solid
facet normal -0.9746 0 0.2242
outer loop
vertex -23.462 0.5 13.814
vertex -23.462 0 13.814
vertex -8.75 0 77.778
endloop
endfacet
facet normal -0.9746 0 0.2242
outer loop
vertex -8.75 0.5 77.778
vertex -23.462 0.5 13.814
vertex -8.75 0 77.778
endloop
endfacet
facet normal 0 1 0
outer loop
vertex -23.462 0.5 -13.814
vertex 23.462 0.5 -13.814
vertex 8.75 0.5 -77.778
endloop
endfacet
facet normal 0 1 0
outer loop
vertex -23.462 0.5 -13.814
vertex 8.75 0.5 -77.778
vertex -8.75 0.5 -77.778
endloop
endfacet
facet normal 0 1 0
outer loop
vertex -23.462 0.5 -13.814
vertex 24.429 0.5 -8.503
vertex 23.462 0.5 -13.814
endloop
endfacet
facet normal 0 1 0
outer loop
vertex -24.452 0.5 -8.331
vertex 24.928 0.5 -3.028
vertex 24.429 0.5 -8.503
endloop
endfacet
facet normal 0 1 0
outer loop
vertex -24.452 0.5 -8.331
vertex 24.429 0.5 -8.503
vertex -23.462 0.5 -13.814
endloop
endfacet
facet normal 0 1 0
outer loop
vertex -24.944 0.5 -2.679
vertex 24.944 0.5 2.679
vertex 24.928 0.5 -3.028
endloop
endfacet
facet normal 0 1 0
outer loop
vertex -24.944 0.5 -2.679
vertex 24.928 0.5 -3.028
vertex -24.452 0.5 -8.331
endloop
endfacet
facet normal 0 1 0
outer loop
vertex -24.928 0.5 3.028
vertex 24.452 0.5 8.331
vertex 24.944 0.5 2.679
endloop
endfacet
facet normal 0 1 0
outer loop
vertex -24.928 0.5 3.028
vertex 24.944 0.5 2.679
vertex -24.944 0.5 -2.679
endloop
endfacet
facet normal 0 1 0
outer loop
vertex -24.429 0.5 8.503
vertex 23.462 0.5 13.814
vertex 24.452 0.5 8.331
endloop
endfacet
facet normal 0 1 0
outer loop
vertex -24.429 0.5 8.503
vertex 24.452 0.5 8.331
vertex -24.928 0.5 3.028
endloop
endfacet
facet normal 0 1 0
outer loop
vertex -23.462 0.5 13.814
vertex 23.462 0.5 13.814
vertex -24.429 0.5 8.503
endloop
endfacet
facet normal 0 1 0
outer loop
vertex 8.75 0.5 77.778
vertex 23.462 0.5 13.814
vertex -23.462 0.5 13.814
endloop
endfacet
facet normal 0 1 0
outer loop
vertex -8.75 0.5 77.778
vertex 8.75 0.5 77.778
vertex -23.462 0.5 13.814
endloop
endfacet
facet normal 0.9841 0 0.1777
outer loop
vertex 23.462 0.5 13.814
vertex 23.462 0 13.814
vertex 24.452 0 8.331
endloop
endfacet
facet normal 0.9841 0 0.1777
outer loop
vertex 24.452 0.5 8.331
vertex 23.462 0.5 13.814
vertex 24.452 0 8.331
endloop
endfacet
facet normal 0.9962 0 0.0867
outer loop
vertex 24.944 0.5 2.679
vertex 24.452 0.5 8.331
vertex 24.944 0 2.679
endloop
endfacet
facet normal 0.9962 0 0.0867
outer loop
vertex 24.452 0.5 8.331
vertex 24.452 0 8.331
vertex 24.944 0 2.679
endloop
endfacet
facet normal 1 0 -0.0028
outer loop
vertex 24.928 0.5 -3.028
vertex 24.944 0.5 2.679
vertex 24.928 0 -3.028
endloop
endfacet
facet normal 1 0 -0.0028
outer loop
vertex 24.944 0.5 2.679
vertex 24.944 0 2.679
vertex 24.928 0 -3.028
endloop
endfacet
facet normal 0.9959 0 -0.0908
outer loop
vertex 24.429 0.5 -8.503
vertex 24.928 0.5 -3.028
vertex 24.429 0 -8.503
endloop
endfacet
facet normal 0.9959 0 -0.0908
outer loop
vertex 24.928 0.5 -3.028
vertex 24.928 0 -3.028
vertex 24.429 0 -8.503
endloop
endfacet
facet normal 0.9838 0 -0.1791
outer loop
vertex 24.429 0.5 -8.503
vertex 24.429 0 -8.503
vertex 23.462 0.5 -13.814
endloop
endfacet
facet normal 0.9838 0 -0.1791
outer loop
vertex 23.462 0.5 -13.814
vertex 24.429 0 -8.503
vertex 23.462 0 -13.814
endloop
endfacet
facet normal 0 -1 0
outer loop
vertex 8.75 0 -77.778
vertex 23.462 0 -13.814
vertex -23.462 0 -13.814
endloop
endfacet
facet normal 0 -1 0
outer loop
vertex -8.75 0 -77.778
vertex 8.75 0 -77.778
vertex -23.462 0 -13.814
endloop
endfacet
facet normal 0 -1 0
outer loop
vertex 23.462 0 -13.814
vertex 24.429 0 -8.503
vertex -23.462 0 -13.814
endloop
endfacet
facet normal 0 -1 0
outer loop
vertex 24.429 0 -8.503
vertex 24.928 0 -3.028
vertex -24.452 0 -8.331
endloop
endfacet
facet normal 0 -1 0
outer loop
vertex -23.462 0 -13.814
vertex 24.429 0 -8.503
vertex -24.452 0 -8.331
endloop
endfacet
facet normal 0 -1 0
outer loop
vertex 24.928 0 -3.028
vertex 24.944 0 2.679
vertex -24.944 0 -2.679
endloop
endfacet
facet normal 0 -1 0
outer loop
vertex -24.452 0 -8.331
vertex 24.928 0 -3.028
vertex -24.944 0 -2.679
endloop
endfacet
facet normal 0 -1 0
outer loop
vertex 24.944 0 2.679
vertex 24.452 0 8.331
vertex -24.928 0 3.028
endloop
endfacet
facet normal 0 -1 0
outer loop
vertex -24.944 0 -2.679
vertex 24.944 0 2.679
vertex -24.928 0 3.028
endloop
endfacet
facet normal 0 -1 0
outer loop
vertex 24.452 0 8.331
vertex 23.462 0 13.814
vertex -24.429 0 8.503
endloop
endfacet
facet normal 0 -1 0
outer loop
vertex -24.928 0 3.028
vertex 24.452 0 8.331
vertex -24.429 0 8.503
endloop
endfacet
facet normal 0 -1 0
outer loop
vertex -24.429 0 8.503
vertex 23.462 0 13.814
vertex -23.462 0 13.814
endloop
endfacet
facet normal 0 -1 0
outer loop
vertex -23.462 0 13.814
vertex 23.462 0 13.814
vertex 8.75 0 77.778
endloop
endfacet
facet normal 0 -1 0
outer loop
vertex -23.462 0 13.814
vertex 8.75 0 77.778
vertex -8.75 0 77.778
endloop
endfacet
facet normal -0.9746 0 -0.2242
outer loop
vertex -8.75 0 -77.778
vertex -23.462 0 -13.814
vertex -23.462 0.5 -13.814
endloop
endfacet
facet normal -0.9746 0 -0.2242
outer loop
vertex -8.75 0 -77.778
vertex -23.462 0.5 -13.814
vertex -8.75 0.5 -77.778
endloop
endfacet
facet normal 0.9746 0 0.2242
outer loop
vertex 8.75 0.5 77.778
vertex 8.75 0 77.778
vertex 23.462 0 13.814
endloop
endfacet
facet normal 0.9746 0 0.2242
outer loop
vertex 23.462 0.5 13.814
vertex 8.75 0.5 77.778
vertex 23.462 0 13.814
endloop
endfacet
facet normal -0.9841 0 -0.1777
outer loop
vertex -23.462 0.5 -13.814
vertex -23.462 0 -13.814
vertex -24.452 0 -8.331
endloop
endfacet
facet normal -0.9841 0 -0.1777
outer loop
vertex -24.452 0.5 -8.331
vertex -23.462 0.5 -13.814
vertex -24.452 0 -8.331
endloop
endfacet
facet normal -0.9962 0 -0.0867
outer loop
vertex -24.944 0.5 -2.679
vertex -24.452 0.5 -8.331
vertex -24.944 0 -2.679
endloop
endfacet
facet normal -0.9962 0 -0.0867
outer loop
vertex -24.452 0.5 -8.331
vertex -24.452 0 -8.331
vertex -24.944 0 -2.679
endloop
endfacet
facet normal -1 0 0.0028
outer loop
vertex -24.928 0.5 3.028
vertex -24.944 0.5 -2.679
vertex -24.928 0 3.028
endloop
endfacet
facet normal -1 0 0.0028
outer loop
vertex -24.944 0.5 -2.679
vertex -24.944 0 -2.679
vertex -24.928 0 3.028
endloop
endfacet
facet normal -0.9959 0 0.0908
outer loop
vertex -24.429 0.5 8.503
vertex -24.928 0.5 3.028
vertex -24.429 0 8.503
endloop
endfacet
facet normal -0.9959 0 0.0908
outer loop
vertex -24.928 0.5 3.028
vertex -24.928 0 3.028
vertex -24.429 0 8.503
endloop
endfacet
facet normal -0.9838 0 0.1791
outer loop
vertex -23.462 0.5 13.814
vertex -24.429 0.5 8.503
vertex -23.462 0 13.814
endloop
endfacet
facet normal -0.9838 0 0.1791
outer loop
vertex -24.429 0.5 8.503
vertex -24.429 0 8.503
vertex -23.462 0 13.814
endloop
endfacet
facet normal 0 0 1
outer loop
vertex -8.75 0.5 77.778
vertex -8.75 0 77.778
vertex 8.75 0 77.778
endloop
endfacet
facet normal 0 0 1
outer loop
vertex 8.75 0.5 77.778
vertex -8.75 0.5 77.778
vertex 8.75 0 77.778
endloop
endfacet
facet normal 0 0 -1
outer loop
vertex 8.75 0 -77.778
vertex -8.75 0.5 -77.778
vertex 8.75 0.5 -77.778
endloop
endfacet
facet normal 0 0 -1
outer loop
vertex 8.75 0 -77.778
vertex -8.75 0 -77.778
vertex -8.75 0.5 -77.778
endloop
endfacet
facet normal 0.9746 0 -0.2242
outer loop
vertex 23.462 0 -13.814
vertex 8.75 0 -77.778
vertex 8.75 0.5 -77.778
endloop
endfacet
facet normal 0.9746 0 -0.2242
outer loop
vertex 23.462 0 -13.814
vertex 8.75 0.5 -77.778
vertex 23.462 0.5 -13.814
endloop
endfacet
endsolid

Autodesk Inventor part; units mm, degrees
ref_plane "YZ Plane" through (0, 0, 0) normal (1, 0, 0) x (0, 1, 0)
ref_plane "XZ Plane" through (0, 0, 0) normal (0, 1, 0) x (-1, 0, 0)
ref_plane "XY Plane" through (0, 0, 0) normal (0, 0, 1) x (1, 0, 0)
sketch "Sketch1" plane through (0, 0, 0) normal (0, 1, 0) x (-1, 0, 0)
  ellipse E0 centre (0, 0) end of major axis (0, -40) minor radius 25
  line L0 (23.4617, 13.8144) -> (8.75, 77.7778)
  line L1 (8.75, 77.7778) -> (-8.75, 77.7778)
  line L2 (-8.75, 77.7778) -> (-23.4617, 13.8144)
  line L3 (23.4617, -13.8144) -> (8.75, -77.7778)
  line L4 (8.75, -77.7778) -> (-8.75, -77.7778)
  line L5 (-8.75, -77.7778) -> (-23.4617, -13.8144)
  point P0 (0, 77.7778)
  point P1 (0, -77.7778)
  dimension "d0" = 25
  dimension "d1" = 40
  dimension "d2" = 77.7778
  dimension "d3" = 77.7778
  dimension "d5" = 17.5
  dimension "d7" = 17.5
extrude "Plate1" add sketch "Sketch1" along normal blind 0.5
equation "\"d2\" = d3"
equation "\"d3\" = 3.11111 * d0"
equation "\"d5\" = d7"
equation "\"d8\" = Thickness"
equation "\"BendRadius\" = Thickness"
equation "\"BendReliefWidth\" = Thickness"
equation "\"BendReliefDepth\" = 0.5 * Thickness"
equation "\"CornerReliefSize\" = 4 * Thickness"
equation "\"MinimumRemnant\" = 2 * Thickness"
equation "\"TransitionRadius\" = BendRadius"
equation "\"JacobiRadiusSize\" = BendRadius"
equation "\"GapSize\" = Thickness"
equation "\"Thickness\" = 0.5"
properties part number "SLING"
